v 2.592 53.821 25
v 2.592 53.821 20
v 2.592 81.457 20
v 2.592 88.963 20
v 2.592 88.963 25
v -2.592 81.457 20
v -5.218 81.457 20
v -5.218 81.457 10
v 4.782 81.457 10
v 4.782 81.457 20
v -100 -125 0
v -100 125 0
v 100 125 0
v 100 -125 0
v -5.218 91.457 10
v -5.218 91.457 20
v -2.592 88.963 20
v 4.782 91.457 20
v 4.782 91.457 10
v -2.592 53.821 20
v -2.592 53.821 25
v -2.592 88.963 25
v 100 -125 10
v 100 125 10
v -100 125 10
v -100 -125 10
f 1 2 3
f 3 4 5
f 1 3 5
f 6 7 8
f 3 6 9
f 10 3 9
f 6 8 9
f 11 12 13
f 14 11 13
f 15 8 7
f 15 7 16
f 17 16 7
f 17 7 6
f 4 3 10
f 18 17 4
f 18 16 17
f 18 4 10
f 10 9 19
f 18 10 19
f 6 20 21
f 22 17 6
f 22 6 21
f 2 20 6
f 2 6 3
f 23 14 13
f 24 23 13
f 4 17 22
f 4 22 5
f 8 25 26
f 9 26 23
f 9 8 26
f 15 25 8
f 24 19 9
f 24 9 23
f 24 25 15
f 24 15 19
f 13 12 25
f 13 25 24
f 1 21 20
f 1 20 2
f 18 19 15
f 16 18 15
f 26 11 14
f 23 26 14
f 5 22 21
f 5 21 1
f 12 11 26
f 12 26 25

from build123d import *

# Parameters (mm, degrees)
F0_W     = 200
F0_H     = 250
F1_DEPTH = 10
F2_W     = 5.21805
F2_H     = 10
F2_W_2   = 4.78195
F3_DEPTH = 10
F5_W     = 5.184704
F5_H     = 5.141512
F6_DEPTH = 5
F7_W     = 5.184704
F7_H     = 5
F8_DEPTH = 30


with BuildPart() as f1:
    # F0 (on Top) → F1 (new body)
    with BuildSketch(Plane.XY):
        Rectangle(F0_W, F0_H)
    extrude(amount=F1_DEPTH)

    # F2 (on face) → F3 (join)
    with BuildSketch(Plane.XY.offset(10)):
        with Locations((-2.609025, 86.457404)):
            Rectangle(F2_W, F2_H)
        with Locations((2.390975, 86.457404)):
            Rectangle(F2_W_2, F2_H)
    extrude(amount=F3_DEPTH)

    # F5 (on face) → F6 (join)
    with BuildSketch(Plane.XY.offset(20)):
        with Locations((0, 86.392045)):
            Rectangle(F5_W, F5_H)
    extrude(amount=F6_DEPTH)

    # F7 (on face) → F8 (join)
    with BuildSketch(Plane.XZ.offset(-83.821289)):
        with Locations((0, 22.5)):
            Rectangle(F7_W, F7_H)
    extrude(amount=F8_DEPTH)


solid = f1.part
